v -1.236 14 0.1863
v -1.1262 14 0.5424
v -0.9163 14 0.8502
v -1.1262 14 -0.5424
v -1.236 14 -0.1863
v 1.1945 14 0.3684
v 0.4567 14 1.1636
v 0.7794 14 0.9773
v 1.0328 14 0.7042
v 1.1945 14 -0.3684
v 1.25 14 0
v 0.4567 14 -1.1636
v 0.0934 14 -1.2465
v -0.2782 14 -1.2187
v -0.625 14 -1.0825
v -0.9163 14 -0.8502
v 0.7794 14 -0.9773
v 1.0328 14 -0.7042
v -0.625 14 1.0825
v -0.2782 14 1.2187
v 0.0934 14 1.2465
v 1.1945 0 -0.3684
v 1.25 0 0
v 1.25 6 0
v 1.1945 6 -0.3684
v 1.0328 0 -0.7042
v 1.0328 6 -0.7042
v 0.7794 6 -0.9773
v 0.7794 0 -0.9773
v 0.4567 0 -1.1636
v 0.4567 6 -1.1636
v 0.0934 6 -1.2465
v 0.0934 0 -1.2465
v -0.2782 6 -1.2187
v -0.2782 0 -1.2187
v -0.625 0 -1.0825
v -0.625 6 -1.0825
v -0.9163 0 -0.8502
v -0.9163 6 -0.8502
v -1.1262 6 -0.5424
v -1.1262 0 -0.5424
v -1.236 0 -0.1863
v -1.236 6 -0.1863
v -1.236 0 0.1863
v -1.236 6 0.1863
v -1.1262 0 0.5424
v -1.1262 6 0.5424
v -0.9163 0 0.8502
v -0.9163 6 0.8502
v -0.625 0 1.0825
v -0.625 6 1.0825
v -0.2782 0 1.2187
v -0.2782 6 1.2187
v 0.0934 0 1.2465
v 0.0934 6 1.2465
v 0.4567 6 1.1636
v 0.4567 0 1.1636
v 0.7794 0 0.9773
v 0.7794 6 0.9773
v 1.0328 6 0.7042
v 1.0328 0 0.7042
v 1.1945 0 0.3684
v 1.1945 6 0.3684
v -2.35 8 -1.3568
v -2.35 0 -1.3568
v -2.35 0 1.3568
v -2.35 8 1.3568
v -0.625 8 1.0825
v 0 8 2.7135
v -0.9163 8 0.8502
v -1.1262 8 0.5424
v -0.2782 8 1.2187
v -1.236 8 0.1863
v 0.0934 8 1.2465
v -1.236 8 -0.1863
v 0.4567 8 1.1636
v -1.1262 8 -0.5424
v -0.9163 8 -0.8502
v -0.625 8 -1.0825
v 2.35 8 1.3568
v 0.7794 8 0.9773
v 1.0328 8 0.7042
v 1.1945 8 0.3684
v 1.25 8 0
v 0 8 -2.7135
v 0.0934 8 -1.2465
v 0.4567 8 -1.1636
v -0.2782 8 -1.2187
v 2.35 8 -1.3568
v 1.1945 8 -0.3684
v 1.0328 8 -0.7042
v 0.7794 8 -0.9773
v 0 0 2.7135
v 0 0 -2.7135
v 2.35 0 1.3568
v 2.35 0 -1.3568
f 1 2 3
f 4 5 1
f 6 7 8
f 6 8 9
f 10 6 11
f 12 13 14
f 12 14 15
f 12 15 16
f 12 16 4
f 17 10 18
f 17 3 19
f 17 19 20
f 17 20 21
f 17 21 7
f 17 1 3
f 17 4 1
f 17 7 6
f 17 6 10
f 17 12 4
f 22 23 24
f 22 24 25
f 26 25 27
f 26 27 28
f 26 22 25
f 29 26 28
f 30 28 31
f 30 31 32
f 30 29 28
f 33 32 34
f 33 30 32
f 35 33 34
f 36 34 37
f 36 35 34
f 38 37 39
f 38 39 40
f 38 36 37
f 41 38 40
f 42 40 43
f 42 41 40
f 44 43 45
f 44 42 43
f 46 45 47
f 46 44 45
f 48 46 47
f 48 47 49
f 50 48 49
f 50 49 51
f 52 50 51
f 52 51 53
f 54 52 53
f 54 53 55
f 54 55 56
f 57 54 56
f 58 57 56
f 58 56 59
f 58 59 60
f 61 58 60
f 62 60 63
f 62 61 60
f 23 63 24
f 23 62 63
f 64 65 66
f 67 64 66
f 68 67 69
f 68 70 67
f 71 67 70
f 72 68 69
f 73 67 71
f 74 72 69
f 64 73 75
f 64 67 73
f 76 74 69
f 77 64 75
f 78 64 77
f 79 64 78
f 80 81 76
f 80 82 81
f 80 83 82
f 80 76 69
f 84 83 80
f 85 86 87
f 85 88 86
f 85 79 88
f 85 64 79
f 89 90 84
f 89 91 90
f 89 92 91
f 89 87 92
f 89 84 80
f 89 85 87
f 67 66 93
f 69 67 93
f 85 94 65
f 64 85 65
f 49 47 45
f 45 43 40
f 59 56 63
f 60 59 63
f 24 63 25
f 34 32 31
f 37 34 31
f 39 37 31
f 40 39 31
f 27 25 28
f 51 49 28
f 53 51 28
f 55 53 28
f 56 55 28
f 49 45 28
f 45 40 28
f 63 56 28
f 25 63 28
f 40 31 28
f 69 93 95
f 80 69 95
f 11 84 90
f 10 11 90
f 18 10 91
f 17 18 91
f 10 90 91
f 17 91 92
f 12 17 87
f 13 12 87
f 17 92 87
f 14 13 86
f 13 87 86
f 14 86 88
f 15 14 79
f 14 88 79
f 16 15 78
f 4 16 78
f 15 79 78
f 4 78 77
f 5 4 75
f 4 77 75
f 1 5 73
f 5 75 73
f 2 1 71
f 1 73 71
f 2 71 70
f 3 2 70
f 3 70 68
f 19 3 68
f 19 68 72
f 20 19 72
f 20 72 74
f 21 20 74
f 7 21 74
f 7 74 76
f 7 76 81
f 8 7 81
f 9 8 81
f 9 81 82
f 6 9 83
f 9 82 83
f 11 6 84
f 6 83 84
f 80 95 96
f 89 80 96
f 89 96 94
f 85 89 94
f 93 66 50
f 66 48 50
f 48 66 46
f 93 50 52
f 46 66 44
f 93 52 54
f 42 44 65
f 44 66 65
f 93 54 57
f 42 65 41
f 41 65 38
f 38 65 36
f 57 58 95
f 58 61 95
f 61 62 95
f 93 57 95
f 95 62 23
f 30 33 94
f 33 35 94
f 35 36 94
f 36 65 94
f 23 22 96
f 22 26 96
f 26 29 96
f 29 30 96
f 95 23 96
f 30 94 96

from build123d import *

# Parameters (mm, degrees)
BOSS_EXTRUDE1_DEPTH = 8
SKETCH2_R           = 1.25
BOSS_EXTRUDE2_DEPTH = 6
CUT_EXTRUDE1_START  = -8
SKETCH2_2_R         = 1.25
CUT_EXTRUDE1_DEPTH  = 6


with BuildPart() as part:
    # Sketch1 → Boss-Extrude1 (new body)
    with BuildSketch(Plane(origin=(0, 0, 0), x_dir=(1, 0, 0), z_dir=(0, 1, 0))):
        Polygon((0, 2.713546265), (-2.35, 1.356773133), (-2.35, -1.356773133), (0, -2.713546265), (2.35, -1.356773133), (2.35, 1.356773133), align=None)
    extrude(amount=BOSS_EXTRUDE1_DEPTH)

    # Sketch2 → Boss-Extrude2 (add)
    with BuildSketch(Plane(origin=(0, 8, 0), x_dir=(1, 0, 0), z_dir=(0, 1, 0))):
        Circle(SKETCH2_R)
    extrude(amount=BOSS_EXTRUDE2_DEPTH)

    # Sketch2<2> → Cut-Extrude1 (cut)
    with BuildSketch(Plane(origin=(0, 8, 0), x_dir=(1, 0, 0), z_dir=(0, 1, 0)).offset(CUT_EXTRUDE1_START)):
        Circle(SKETCH2_2_R)
    extrude(amount=CUT_EXTRUDE1_DEPTH, mode=Mode.SUBTRACT)


solid = part.part
